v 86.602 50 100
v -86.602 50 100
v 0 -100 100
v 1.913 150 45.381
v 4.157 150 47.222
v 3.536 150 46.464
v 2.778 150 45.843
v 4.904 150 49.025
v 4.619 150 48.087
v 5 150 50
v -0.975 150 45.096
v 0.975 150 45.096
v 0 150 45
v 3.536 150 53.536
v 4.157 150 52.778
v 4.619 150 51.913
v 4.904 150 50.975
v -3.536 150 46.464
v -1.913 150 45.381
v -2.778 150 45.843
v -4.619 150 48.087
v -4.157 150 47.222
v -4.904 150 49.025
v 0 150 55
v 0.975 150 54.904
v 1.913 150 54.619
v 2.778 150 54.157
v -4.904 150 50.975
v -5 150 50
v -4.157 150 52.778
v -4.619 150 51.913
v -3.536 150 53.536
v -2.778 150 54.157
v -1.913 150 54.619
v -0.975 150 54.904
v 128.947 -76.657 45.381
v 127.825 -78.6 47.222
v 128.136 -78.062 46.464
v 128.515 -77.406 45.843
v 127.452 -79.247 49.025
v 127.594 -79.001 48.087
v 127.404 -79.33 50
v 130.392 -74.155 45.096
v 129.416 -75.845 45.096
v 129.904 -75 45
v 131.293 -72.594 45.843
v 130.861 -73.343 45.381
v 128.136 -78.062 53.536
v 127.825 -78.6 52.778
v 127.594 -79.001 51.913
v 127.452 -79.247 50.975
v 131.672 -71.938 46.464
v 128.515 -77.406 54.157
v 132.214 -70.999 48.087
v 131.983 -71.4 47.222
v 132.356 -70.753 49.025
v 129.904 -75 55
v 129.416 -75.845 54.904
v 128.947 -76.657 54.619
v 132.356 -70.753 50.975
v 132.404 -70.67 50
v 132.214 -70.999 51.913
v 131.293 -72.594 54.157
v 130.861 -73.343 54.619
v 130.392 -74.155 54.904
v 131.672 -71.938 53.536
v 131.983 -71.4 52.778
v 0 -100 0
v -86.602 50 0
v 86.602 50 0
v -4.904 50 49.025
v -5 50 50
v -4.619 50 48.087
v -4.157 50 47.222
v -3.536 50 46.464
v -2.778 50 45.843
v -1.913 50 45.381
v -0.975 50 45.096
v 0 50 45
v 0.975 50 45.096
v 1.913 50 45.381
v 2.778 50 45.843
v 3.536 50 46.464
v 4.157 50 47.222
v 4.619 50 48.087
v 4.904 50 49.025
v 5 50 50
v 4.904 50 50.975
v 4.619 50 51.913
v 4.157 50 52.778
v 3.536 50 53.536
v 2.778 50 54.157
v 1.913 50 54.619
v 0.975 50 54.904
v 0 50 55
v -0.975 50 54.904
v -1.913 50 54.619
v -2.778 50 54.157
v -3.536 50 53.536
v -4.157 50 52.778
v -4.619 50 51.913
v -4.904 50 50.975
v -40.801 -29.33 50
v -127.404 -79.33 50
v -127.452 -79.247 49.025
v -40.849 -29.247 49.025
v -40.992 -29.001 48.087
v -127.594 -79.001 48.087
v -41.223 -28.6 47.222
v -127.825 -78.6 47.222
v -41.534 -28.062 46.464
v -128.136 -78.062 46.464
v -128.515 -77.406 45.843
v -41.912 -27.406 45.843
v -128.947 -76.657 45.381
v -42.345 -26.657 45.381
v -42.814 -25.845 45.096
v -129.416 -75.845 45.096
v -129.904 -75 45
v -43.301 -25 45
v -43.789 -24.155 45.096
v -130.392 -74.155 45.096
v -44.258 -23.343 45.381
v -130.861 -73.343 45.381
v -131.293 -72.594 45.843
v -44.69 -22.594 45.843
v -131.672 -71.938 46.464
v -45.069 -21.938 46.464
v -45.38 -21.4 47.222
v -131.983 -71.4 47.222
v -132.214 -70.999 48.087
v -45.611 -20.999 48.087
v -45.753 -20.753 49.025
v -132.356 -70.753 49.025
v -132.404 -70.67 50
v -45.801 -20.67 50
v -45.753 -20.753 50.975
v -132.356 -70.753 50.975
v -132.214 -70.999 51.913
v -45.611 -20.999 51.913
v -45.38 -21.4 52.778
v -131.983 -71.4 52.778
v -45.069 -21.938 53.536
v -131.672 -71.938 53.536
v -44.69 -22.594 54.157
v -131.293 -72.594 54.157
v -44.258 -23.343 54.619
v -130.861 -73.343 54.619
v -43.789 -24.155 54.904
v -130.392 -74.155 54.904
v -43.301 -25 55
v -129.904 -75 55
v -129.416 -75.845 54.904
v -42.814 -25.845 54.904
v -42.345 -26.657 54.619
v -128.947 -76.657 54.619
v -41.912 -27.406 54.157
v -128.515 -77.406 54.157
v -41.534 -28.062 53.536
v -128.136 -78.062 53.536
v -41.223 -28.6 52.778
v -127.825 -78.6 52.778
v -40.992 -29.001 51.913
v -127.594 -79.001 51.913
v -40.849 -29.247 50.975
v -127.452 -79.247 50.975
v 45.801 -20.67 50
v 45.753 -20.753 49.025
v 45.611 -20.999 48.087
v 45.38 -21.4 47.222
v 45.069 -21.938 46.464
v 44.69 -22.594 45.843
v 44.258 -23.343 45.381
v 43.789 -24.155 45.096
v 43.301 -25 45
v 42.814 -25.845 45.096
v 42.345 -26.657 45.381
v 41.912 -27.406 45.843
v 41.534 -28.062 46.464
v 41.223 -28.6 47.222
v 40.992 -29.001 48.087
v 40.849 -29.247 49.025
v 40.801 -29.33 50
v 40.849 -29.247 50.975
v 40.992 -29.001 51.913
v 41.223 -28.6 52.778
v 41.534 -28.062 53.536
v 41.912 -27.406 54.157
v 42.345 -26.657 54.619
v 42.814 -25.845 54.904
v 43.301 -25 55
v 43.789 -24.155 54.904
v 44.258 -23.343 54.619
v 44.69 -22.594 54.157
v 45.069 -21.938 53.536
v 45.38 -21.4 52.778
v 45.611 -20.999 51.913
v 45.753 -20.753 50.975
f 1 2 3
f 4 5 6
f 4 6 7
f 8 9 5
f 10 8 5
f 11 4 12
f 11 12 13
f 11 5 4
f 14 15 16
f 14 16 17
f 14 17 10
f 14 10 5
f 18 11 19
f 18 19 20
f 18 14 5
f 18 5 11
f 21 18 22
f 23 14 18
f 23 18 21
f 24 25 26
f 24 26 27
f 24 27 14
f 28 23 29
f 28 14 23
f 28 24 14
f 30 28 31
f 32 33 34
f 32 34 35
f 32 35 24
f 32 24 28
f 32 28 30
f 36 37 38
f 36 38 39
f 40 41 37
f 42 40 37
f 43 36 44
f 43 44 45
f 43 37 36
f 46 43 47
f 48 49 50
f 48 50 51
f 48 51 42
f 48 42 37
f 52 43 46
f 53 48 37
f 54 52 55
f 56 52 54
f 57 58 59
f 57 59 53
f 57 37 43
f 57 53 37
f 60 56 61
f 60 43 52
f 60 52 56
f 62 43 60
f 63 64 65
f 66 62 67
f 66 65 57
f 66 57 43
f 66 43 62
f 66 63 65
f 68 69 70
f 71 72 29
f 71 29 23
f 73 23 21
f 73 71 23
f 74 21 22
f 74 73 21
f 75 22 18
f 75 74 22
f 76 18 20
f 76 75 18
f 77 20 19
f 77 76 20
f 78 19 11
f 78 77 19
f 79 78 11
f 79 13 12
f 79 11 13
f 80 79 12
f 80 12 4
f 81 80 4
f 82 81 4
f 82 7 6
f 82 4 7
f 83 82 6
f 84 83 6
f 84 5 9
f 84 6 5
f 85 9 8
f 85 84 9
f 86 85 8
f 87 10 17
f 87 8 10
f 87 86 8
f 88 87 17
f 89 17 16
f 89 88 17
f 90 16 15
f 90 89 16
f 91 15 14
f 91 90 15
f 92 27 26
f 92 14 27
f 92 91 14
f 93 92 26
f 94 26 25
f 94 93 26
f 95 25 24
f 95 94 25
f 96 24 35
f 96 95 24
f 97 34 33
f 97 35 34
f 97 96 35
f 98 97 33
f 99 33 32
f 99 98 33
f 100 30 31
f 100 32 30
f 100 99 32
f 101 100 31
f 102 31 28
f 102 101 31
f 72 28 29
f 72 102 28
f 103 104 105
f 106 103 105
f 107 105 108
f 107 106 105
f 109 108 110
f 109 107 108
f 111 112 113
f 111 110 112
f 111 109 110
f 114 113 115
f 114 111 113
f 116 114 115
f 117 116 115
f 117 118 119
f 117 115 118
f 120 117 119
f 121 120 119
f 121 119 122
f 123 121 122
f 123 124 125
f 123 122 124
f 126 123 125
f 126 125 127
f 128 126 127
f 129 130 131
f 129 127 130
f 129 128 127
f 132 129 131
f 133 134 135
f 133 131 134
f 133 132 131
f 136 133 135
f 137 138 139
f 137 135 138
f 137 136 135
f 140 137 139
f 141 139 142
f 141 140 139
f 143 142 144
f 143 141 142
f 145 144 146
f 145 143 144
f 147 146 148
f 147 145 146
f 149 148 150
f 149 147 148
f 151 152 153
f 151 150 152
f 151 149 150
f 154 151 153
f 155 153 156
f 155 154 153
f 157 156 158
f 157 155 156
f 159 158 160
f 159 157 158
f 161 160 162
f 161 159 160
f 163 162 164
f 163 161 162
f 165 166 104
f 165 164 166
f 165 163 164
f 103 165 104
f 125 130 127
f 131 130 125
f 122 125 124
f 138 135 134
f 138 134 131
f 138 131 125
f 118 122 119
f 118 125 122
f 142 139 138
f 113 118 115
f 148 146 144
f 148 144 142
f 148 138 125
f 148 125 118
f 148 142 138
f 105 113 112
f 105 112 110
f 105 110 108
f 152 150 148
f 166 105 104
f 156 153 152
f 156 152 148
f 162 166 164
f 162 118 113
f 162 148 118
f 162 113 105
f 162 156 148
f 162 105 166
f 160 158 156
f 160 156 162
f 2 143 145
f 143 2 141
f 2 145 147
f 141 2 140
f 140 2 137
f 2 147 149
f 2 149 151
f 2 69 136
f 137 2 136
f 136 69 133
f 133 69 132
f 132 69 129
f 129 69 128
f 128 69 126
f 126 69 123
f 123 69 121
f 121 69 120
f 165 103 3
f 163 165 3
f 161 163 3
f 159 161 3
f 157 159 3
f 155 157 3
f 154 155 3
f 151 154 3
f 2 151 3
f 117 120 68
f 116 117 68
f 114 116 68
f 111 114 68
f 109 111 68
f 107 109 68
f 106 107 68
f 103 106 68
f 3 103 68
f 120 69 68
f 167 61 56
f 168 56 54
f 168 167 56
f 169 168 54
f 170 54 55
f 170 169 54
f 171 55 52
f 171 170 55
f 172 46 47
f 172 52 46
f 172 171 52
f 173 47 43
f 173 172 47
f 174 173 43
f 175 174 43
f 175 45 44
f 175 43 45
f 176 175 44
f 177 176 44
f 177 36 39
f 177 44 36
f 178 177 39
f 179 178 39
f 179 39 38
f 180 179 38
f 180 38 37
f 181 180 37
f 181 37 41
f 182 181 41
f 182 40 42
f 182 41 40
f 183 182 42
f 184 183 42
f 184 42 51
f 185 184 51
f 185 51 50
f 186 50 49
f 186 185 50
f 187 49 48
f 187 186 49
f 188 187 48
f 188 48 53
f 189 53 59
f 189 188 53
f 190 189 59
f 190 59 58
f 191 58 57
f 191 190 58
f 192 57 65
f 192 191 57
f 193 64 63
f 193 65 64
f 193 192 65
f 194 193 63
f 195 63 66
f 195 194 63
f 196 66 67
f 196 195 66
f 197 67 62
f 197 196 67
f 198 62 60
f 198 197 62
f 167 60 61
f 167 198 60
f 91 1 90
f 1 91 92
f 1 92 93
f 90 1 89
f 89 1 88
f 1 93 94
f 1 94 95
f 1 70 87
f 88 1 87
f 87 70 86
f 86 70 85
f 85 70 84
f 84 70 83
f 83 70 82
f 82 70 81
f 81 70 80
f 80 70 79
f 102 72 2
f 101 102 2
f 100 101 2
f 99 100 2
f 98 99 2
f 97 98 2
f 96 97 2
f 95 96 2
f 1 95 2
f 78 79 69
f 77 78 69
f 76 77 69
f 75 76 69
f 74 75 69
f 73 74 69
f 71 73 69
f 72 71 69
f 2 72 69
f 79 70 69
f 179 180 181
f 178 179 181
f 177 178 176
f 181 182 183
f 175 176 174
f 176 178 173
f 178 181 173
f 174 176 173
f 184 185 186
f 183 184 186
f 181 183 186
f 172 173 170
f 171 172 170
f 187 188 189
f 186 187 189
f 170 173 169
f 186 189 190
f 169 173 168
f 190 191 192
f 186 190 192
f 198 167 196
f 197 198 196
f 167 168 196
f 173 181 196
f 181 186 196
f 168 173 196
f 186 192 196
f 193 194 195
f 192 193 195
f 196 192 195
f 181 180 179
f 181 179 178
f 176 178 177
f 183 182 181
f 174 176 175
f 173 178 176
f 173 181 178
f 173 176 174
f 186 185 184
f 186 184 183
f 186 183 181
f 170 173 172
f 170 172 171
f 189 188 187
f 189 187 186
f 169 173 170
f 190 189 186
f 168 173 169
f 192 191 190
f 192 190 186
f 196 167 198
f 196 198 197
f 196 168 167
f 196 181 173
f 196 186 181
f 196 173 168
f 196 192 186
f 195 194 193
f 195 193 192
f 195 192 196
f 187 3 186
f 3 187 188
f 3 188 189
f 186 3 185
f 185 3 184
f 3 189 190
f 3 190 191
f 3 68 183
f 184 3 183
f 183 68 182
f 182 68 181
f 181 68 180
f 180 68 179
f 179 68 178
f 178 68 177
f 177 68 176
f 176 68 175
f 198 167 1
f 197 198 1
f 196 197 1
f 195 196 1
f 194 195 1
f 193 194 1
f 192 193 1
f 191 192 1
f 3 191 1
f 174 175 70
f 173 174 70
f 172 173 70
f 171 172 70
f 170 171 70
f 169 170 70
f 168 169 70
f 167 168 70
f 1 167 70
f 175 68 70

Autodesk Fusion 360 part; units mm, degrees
sketch "Çizim1" plane through (0, 0, 0) normal (0, 0, 1) x (1, 0, 0)
  line L0 (-86.6025, 50) -> (0, -100)
  line L1 (0, -100) -> (86.6025, 50)
  line L2 (86.6025, 50) -> (-86.6025, 50)
  dimension "d1" = 50
extrude "Ekstrüzyon1" add sketch "Çizim1" along normal blind 100 makes body 1
sketch "Çizim2" plane through (43.3013, -25, 0) normal (0.866, -0.5, 0) x (0.5, 0.866, 0)
  line L0 (-86.6025, 0) -> (86.6025, 0)
  line L1 (86.6025, 0) -> (86.6025, 100)
  line L2 (86.6025, 100) -> (-86.6025, 100)
  line L3 (-86.6025, 100) -> (-86.6025, 0)
  circle A0 centre (0, 50) radius 5
  dimension "d4" = 10
extrude "Ekstrüzyon2" add sketch "Çizim2" along normal blind 100 contours A0 bodies 1
split "Böl1" by plane through (0, -100, 0) normal (0.866, -0.5, 0) bodies 1 makes body 2 at (100.6022, -59.0853, 54.924)
sketch "Çizim3" plane through (0, 50, 0) normal (0, 1, 0) x (-1, 0, 0)
  line L0 (-86.6025, 0) -> (86.6025, 0)
  line L1 (86.6025, 0) -> (86.6025, 100)
  line L2 (86.6025, 100) -> (-86.6025, 100)
  line L3 (-86.6025, 100) -> (-86.6025, 0)
  circle A0 centre (0, 50) radius 5
  dimension "d7" = 10
extrude "Ekstrüzyon3" add sketch "Çizim3" along normal blind 100 contours A0 bodies 1
sketch "Çizim4" plane through (-43.3013, -25, 0) normal (-0.866, -0.5, 0) x (0.5, -0.866, 0)
  line L0 (-86.6025, 0) -> (86.6025, 0)
  line L1 (86.6025, 0) -> (86.6025, 100)
  line L2 (86.6025, 100) -> (-86.6025, 100)
  line L3 (-86.6025, 100) -> (-86.6025, 0)
  circle A0 centre (0, 50) radius 5
  dimension "d10" = 10
extrude "Ekstrüzyon4" add sketch "Çizim4" along normal blind 100 contours A0 bodies 1
